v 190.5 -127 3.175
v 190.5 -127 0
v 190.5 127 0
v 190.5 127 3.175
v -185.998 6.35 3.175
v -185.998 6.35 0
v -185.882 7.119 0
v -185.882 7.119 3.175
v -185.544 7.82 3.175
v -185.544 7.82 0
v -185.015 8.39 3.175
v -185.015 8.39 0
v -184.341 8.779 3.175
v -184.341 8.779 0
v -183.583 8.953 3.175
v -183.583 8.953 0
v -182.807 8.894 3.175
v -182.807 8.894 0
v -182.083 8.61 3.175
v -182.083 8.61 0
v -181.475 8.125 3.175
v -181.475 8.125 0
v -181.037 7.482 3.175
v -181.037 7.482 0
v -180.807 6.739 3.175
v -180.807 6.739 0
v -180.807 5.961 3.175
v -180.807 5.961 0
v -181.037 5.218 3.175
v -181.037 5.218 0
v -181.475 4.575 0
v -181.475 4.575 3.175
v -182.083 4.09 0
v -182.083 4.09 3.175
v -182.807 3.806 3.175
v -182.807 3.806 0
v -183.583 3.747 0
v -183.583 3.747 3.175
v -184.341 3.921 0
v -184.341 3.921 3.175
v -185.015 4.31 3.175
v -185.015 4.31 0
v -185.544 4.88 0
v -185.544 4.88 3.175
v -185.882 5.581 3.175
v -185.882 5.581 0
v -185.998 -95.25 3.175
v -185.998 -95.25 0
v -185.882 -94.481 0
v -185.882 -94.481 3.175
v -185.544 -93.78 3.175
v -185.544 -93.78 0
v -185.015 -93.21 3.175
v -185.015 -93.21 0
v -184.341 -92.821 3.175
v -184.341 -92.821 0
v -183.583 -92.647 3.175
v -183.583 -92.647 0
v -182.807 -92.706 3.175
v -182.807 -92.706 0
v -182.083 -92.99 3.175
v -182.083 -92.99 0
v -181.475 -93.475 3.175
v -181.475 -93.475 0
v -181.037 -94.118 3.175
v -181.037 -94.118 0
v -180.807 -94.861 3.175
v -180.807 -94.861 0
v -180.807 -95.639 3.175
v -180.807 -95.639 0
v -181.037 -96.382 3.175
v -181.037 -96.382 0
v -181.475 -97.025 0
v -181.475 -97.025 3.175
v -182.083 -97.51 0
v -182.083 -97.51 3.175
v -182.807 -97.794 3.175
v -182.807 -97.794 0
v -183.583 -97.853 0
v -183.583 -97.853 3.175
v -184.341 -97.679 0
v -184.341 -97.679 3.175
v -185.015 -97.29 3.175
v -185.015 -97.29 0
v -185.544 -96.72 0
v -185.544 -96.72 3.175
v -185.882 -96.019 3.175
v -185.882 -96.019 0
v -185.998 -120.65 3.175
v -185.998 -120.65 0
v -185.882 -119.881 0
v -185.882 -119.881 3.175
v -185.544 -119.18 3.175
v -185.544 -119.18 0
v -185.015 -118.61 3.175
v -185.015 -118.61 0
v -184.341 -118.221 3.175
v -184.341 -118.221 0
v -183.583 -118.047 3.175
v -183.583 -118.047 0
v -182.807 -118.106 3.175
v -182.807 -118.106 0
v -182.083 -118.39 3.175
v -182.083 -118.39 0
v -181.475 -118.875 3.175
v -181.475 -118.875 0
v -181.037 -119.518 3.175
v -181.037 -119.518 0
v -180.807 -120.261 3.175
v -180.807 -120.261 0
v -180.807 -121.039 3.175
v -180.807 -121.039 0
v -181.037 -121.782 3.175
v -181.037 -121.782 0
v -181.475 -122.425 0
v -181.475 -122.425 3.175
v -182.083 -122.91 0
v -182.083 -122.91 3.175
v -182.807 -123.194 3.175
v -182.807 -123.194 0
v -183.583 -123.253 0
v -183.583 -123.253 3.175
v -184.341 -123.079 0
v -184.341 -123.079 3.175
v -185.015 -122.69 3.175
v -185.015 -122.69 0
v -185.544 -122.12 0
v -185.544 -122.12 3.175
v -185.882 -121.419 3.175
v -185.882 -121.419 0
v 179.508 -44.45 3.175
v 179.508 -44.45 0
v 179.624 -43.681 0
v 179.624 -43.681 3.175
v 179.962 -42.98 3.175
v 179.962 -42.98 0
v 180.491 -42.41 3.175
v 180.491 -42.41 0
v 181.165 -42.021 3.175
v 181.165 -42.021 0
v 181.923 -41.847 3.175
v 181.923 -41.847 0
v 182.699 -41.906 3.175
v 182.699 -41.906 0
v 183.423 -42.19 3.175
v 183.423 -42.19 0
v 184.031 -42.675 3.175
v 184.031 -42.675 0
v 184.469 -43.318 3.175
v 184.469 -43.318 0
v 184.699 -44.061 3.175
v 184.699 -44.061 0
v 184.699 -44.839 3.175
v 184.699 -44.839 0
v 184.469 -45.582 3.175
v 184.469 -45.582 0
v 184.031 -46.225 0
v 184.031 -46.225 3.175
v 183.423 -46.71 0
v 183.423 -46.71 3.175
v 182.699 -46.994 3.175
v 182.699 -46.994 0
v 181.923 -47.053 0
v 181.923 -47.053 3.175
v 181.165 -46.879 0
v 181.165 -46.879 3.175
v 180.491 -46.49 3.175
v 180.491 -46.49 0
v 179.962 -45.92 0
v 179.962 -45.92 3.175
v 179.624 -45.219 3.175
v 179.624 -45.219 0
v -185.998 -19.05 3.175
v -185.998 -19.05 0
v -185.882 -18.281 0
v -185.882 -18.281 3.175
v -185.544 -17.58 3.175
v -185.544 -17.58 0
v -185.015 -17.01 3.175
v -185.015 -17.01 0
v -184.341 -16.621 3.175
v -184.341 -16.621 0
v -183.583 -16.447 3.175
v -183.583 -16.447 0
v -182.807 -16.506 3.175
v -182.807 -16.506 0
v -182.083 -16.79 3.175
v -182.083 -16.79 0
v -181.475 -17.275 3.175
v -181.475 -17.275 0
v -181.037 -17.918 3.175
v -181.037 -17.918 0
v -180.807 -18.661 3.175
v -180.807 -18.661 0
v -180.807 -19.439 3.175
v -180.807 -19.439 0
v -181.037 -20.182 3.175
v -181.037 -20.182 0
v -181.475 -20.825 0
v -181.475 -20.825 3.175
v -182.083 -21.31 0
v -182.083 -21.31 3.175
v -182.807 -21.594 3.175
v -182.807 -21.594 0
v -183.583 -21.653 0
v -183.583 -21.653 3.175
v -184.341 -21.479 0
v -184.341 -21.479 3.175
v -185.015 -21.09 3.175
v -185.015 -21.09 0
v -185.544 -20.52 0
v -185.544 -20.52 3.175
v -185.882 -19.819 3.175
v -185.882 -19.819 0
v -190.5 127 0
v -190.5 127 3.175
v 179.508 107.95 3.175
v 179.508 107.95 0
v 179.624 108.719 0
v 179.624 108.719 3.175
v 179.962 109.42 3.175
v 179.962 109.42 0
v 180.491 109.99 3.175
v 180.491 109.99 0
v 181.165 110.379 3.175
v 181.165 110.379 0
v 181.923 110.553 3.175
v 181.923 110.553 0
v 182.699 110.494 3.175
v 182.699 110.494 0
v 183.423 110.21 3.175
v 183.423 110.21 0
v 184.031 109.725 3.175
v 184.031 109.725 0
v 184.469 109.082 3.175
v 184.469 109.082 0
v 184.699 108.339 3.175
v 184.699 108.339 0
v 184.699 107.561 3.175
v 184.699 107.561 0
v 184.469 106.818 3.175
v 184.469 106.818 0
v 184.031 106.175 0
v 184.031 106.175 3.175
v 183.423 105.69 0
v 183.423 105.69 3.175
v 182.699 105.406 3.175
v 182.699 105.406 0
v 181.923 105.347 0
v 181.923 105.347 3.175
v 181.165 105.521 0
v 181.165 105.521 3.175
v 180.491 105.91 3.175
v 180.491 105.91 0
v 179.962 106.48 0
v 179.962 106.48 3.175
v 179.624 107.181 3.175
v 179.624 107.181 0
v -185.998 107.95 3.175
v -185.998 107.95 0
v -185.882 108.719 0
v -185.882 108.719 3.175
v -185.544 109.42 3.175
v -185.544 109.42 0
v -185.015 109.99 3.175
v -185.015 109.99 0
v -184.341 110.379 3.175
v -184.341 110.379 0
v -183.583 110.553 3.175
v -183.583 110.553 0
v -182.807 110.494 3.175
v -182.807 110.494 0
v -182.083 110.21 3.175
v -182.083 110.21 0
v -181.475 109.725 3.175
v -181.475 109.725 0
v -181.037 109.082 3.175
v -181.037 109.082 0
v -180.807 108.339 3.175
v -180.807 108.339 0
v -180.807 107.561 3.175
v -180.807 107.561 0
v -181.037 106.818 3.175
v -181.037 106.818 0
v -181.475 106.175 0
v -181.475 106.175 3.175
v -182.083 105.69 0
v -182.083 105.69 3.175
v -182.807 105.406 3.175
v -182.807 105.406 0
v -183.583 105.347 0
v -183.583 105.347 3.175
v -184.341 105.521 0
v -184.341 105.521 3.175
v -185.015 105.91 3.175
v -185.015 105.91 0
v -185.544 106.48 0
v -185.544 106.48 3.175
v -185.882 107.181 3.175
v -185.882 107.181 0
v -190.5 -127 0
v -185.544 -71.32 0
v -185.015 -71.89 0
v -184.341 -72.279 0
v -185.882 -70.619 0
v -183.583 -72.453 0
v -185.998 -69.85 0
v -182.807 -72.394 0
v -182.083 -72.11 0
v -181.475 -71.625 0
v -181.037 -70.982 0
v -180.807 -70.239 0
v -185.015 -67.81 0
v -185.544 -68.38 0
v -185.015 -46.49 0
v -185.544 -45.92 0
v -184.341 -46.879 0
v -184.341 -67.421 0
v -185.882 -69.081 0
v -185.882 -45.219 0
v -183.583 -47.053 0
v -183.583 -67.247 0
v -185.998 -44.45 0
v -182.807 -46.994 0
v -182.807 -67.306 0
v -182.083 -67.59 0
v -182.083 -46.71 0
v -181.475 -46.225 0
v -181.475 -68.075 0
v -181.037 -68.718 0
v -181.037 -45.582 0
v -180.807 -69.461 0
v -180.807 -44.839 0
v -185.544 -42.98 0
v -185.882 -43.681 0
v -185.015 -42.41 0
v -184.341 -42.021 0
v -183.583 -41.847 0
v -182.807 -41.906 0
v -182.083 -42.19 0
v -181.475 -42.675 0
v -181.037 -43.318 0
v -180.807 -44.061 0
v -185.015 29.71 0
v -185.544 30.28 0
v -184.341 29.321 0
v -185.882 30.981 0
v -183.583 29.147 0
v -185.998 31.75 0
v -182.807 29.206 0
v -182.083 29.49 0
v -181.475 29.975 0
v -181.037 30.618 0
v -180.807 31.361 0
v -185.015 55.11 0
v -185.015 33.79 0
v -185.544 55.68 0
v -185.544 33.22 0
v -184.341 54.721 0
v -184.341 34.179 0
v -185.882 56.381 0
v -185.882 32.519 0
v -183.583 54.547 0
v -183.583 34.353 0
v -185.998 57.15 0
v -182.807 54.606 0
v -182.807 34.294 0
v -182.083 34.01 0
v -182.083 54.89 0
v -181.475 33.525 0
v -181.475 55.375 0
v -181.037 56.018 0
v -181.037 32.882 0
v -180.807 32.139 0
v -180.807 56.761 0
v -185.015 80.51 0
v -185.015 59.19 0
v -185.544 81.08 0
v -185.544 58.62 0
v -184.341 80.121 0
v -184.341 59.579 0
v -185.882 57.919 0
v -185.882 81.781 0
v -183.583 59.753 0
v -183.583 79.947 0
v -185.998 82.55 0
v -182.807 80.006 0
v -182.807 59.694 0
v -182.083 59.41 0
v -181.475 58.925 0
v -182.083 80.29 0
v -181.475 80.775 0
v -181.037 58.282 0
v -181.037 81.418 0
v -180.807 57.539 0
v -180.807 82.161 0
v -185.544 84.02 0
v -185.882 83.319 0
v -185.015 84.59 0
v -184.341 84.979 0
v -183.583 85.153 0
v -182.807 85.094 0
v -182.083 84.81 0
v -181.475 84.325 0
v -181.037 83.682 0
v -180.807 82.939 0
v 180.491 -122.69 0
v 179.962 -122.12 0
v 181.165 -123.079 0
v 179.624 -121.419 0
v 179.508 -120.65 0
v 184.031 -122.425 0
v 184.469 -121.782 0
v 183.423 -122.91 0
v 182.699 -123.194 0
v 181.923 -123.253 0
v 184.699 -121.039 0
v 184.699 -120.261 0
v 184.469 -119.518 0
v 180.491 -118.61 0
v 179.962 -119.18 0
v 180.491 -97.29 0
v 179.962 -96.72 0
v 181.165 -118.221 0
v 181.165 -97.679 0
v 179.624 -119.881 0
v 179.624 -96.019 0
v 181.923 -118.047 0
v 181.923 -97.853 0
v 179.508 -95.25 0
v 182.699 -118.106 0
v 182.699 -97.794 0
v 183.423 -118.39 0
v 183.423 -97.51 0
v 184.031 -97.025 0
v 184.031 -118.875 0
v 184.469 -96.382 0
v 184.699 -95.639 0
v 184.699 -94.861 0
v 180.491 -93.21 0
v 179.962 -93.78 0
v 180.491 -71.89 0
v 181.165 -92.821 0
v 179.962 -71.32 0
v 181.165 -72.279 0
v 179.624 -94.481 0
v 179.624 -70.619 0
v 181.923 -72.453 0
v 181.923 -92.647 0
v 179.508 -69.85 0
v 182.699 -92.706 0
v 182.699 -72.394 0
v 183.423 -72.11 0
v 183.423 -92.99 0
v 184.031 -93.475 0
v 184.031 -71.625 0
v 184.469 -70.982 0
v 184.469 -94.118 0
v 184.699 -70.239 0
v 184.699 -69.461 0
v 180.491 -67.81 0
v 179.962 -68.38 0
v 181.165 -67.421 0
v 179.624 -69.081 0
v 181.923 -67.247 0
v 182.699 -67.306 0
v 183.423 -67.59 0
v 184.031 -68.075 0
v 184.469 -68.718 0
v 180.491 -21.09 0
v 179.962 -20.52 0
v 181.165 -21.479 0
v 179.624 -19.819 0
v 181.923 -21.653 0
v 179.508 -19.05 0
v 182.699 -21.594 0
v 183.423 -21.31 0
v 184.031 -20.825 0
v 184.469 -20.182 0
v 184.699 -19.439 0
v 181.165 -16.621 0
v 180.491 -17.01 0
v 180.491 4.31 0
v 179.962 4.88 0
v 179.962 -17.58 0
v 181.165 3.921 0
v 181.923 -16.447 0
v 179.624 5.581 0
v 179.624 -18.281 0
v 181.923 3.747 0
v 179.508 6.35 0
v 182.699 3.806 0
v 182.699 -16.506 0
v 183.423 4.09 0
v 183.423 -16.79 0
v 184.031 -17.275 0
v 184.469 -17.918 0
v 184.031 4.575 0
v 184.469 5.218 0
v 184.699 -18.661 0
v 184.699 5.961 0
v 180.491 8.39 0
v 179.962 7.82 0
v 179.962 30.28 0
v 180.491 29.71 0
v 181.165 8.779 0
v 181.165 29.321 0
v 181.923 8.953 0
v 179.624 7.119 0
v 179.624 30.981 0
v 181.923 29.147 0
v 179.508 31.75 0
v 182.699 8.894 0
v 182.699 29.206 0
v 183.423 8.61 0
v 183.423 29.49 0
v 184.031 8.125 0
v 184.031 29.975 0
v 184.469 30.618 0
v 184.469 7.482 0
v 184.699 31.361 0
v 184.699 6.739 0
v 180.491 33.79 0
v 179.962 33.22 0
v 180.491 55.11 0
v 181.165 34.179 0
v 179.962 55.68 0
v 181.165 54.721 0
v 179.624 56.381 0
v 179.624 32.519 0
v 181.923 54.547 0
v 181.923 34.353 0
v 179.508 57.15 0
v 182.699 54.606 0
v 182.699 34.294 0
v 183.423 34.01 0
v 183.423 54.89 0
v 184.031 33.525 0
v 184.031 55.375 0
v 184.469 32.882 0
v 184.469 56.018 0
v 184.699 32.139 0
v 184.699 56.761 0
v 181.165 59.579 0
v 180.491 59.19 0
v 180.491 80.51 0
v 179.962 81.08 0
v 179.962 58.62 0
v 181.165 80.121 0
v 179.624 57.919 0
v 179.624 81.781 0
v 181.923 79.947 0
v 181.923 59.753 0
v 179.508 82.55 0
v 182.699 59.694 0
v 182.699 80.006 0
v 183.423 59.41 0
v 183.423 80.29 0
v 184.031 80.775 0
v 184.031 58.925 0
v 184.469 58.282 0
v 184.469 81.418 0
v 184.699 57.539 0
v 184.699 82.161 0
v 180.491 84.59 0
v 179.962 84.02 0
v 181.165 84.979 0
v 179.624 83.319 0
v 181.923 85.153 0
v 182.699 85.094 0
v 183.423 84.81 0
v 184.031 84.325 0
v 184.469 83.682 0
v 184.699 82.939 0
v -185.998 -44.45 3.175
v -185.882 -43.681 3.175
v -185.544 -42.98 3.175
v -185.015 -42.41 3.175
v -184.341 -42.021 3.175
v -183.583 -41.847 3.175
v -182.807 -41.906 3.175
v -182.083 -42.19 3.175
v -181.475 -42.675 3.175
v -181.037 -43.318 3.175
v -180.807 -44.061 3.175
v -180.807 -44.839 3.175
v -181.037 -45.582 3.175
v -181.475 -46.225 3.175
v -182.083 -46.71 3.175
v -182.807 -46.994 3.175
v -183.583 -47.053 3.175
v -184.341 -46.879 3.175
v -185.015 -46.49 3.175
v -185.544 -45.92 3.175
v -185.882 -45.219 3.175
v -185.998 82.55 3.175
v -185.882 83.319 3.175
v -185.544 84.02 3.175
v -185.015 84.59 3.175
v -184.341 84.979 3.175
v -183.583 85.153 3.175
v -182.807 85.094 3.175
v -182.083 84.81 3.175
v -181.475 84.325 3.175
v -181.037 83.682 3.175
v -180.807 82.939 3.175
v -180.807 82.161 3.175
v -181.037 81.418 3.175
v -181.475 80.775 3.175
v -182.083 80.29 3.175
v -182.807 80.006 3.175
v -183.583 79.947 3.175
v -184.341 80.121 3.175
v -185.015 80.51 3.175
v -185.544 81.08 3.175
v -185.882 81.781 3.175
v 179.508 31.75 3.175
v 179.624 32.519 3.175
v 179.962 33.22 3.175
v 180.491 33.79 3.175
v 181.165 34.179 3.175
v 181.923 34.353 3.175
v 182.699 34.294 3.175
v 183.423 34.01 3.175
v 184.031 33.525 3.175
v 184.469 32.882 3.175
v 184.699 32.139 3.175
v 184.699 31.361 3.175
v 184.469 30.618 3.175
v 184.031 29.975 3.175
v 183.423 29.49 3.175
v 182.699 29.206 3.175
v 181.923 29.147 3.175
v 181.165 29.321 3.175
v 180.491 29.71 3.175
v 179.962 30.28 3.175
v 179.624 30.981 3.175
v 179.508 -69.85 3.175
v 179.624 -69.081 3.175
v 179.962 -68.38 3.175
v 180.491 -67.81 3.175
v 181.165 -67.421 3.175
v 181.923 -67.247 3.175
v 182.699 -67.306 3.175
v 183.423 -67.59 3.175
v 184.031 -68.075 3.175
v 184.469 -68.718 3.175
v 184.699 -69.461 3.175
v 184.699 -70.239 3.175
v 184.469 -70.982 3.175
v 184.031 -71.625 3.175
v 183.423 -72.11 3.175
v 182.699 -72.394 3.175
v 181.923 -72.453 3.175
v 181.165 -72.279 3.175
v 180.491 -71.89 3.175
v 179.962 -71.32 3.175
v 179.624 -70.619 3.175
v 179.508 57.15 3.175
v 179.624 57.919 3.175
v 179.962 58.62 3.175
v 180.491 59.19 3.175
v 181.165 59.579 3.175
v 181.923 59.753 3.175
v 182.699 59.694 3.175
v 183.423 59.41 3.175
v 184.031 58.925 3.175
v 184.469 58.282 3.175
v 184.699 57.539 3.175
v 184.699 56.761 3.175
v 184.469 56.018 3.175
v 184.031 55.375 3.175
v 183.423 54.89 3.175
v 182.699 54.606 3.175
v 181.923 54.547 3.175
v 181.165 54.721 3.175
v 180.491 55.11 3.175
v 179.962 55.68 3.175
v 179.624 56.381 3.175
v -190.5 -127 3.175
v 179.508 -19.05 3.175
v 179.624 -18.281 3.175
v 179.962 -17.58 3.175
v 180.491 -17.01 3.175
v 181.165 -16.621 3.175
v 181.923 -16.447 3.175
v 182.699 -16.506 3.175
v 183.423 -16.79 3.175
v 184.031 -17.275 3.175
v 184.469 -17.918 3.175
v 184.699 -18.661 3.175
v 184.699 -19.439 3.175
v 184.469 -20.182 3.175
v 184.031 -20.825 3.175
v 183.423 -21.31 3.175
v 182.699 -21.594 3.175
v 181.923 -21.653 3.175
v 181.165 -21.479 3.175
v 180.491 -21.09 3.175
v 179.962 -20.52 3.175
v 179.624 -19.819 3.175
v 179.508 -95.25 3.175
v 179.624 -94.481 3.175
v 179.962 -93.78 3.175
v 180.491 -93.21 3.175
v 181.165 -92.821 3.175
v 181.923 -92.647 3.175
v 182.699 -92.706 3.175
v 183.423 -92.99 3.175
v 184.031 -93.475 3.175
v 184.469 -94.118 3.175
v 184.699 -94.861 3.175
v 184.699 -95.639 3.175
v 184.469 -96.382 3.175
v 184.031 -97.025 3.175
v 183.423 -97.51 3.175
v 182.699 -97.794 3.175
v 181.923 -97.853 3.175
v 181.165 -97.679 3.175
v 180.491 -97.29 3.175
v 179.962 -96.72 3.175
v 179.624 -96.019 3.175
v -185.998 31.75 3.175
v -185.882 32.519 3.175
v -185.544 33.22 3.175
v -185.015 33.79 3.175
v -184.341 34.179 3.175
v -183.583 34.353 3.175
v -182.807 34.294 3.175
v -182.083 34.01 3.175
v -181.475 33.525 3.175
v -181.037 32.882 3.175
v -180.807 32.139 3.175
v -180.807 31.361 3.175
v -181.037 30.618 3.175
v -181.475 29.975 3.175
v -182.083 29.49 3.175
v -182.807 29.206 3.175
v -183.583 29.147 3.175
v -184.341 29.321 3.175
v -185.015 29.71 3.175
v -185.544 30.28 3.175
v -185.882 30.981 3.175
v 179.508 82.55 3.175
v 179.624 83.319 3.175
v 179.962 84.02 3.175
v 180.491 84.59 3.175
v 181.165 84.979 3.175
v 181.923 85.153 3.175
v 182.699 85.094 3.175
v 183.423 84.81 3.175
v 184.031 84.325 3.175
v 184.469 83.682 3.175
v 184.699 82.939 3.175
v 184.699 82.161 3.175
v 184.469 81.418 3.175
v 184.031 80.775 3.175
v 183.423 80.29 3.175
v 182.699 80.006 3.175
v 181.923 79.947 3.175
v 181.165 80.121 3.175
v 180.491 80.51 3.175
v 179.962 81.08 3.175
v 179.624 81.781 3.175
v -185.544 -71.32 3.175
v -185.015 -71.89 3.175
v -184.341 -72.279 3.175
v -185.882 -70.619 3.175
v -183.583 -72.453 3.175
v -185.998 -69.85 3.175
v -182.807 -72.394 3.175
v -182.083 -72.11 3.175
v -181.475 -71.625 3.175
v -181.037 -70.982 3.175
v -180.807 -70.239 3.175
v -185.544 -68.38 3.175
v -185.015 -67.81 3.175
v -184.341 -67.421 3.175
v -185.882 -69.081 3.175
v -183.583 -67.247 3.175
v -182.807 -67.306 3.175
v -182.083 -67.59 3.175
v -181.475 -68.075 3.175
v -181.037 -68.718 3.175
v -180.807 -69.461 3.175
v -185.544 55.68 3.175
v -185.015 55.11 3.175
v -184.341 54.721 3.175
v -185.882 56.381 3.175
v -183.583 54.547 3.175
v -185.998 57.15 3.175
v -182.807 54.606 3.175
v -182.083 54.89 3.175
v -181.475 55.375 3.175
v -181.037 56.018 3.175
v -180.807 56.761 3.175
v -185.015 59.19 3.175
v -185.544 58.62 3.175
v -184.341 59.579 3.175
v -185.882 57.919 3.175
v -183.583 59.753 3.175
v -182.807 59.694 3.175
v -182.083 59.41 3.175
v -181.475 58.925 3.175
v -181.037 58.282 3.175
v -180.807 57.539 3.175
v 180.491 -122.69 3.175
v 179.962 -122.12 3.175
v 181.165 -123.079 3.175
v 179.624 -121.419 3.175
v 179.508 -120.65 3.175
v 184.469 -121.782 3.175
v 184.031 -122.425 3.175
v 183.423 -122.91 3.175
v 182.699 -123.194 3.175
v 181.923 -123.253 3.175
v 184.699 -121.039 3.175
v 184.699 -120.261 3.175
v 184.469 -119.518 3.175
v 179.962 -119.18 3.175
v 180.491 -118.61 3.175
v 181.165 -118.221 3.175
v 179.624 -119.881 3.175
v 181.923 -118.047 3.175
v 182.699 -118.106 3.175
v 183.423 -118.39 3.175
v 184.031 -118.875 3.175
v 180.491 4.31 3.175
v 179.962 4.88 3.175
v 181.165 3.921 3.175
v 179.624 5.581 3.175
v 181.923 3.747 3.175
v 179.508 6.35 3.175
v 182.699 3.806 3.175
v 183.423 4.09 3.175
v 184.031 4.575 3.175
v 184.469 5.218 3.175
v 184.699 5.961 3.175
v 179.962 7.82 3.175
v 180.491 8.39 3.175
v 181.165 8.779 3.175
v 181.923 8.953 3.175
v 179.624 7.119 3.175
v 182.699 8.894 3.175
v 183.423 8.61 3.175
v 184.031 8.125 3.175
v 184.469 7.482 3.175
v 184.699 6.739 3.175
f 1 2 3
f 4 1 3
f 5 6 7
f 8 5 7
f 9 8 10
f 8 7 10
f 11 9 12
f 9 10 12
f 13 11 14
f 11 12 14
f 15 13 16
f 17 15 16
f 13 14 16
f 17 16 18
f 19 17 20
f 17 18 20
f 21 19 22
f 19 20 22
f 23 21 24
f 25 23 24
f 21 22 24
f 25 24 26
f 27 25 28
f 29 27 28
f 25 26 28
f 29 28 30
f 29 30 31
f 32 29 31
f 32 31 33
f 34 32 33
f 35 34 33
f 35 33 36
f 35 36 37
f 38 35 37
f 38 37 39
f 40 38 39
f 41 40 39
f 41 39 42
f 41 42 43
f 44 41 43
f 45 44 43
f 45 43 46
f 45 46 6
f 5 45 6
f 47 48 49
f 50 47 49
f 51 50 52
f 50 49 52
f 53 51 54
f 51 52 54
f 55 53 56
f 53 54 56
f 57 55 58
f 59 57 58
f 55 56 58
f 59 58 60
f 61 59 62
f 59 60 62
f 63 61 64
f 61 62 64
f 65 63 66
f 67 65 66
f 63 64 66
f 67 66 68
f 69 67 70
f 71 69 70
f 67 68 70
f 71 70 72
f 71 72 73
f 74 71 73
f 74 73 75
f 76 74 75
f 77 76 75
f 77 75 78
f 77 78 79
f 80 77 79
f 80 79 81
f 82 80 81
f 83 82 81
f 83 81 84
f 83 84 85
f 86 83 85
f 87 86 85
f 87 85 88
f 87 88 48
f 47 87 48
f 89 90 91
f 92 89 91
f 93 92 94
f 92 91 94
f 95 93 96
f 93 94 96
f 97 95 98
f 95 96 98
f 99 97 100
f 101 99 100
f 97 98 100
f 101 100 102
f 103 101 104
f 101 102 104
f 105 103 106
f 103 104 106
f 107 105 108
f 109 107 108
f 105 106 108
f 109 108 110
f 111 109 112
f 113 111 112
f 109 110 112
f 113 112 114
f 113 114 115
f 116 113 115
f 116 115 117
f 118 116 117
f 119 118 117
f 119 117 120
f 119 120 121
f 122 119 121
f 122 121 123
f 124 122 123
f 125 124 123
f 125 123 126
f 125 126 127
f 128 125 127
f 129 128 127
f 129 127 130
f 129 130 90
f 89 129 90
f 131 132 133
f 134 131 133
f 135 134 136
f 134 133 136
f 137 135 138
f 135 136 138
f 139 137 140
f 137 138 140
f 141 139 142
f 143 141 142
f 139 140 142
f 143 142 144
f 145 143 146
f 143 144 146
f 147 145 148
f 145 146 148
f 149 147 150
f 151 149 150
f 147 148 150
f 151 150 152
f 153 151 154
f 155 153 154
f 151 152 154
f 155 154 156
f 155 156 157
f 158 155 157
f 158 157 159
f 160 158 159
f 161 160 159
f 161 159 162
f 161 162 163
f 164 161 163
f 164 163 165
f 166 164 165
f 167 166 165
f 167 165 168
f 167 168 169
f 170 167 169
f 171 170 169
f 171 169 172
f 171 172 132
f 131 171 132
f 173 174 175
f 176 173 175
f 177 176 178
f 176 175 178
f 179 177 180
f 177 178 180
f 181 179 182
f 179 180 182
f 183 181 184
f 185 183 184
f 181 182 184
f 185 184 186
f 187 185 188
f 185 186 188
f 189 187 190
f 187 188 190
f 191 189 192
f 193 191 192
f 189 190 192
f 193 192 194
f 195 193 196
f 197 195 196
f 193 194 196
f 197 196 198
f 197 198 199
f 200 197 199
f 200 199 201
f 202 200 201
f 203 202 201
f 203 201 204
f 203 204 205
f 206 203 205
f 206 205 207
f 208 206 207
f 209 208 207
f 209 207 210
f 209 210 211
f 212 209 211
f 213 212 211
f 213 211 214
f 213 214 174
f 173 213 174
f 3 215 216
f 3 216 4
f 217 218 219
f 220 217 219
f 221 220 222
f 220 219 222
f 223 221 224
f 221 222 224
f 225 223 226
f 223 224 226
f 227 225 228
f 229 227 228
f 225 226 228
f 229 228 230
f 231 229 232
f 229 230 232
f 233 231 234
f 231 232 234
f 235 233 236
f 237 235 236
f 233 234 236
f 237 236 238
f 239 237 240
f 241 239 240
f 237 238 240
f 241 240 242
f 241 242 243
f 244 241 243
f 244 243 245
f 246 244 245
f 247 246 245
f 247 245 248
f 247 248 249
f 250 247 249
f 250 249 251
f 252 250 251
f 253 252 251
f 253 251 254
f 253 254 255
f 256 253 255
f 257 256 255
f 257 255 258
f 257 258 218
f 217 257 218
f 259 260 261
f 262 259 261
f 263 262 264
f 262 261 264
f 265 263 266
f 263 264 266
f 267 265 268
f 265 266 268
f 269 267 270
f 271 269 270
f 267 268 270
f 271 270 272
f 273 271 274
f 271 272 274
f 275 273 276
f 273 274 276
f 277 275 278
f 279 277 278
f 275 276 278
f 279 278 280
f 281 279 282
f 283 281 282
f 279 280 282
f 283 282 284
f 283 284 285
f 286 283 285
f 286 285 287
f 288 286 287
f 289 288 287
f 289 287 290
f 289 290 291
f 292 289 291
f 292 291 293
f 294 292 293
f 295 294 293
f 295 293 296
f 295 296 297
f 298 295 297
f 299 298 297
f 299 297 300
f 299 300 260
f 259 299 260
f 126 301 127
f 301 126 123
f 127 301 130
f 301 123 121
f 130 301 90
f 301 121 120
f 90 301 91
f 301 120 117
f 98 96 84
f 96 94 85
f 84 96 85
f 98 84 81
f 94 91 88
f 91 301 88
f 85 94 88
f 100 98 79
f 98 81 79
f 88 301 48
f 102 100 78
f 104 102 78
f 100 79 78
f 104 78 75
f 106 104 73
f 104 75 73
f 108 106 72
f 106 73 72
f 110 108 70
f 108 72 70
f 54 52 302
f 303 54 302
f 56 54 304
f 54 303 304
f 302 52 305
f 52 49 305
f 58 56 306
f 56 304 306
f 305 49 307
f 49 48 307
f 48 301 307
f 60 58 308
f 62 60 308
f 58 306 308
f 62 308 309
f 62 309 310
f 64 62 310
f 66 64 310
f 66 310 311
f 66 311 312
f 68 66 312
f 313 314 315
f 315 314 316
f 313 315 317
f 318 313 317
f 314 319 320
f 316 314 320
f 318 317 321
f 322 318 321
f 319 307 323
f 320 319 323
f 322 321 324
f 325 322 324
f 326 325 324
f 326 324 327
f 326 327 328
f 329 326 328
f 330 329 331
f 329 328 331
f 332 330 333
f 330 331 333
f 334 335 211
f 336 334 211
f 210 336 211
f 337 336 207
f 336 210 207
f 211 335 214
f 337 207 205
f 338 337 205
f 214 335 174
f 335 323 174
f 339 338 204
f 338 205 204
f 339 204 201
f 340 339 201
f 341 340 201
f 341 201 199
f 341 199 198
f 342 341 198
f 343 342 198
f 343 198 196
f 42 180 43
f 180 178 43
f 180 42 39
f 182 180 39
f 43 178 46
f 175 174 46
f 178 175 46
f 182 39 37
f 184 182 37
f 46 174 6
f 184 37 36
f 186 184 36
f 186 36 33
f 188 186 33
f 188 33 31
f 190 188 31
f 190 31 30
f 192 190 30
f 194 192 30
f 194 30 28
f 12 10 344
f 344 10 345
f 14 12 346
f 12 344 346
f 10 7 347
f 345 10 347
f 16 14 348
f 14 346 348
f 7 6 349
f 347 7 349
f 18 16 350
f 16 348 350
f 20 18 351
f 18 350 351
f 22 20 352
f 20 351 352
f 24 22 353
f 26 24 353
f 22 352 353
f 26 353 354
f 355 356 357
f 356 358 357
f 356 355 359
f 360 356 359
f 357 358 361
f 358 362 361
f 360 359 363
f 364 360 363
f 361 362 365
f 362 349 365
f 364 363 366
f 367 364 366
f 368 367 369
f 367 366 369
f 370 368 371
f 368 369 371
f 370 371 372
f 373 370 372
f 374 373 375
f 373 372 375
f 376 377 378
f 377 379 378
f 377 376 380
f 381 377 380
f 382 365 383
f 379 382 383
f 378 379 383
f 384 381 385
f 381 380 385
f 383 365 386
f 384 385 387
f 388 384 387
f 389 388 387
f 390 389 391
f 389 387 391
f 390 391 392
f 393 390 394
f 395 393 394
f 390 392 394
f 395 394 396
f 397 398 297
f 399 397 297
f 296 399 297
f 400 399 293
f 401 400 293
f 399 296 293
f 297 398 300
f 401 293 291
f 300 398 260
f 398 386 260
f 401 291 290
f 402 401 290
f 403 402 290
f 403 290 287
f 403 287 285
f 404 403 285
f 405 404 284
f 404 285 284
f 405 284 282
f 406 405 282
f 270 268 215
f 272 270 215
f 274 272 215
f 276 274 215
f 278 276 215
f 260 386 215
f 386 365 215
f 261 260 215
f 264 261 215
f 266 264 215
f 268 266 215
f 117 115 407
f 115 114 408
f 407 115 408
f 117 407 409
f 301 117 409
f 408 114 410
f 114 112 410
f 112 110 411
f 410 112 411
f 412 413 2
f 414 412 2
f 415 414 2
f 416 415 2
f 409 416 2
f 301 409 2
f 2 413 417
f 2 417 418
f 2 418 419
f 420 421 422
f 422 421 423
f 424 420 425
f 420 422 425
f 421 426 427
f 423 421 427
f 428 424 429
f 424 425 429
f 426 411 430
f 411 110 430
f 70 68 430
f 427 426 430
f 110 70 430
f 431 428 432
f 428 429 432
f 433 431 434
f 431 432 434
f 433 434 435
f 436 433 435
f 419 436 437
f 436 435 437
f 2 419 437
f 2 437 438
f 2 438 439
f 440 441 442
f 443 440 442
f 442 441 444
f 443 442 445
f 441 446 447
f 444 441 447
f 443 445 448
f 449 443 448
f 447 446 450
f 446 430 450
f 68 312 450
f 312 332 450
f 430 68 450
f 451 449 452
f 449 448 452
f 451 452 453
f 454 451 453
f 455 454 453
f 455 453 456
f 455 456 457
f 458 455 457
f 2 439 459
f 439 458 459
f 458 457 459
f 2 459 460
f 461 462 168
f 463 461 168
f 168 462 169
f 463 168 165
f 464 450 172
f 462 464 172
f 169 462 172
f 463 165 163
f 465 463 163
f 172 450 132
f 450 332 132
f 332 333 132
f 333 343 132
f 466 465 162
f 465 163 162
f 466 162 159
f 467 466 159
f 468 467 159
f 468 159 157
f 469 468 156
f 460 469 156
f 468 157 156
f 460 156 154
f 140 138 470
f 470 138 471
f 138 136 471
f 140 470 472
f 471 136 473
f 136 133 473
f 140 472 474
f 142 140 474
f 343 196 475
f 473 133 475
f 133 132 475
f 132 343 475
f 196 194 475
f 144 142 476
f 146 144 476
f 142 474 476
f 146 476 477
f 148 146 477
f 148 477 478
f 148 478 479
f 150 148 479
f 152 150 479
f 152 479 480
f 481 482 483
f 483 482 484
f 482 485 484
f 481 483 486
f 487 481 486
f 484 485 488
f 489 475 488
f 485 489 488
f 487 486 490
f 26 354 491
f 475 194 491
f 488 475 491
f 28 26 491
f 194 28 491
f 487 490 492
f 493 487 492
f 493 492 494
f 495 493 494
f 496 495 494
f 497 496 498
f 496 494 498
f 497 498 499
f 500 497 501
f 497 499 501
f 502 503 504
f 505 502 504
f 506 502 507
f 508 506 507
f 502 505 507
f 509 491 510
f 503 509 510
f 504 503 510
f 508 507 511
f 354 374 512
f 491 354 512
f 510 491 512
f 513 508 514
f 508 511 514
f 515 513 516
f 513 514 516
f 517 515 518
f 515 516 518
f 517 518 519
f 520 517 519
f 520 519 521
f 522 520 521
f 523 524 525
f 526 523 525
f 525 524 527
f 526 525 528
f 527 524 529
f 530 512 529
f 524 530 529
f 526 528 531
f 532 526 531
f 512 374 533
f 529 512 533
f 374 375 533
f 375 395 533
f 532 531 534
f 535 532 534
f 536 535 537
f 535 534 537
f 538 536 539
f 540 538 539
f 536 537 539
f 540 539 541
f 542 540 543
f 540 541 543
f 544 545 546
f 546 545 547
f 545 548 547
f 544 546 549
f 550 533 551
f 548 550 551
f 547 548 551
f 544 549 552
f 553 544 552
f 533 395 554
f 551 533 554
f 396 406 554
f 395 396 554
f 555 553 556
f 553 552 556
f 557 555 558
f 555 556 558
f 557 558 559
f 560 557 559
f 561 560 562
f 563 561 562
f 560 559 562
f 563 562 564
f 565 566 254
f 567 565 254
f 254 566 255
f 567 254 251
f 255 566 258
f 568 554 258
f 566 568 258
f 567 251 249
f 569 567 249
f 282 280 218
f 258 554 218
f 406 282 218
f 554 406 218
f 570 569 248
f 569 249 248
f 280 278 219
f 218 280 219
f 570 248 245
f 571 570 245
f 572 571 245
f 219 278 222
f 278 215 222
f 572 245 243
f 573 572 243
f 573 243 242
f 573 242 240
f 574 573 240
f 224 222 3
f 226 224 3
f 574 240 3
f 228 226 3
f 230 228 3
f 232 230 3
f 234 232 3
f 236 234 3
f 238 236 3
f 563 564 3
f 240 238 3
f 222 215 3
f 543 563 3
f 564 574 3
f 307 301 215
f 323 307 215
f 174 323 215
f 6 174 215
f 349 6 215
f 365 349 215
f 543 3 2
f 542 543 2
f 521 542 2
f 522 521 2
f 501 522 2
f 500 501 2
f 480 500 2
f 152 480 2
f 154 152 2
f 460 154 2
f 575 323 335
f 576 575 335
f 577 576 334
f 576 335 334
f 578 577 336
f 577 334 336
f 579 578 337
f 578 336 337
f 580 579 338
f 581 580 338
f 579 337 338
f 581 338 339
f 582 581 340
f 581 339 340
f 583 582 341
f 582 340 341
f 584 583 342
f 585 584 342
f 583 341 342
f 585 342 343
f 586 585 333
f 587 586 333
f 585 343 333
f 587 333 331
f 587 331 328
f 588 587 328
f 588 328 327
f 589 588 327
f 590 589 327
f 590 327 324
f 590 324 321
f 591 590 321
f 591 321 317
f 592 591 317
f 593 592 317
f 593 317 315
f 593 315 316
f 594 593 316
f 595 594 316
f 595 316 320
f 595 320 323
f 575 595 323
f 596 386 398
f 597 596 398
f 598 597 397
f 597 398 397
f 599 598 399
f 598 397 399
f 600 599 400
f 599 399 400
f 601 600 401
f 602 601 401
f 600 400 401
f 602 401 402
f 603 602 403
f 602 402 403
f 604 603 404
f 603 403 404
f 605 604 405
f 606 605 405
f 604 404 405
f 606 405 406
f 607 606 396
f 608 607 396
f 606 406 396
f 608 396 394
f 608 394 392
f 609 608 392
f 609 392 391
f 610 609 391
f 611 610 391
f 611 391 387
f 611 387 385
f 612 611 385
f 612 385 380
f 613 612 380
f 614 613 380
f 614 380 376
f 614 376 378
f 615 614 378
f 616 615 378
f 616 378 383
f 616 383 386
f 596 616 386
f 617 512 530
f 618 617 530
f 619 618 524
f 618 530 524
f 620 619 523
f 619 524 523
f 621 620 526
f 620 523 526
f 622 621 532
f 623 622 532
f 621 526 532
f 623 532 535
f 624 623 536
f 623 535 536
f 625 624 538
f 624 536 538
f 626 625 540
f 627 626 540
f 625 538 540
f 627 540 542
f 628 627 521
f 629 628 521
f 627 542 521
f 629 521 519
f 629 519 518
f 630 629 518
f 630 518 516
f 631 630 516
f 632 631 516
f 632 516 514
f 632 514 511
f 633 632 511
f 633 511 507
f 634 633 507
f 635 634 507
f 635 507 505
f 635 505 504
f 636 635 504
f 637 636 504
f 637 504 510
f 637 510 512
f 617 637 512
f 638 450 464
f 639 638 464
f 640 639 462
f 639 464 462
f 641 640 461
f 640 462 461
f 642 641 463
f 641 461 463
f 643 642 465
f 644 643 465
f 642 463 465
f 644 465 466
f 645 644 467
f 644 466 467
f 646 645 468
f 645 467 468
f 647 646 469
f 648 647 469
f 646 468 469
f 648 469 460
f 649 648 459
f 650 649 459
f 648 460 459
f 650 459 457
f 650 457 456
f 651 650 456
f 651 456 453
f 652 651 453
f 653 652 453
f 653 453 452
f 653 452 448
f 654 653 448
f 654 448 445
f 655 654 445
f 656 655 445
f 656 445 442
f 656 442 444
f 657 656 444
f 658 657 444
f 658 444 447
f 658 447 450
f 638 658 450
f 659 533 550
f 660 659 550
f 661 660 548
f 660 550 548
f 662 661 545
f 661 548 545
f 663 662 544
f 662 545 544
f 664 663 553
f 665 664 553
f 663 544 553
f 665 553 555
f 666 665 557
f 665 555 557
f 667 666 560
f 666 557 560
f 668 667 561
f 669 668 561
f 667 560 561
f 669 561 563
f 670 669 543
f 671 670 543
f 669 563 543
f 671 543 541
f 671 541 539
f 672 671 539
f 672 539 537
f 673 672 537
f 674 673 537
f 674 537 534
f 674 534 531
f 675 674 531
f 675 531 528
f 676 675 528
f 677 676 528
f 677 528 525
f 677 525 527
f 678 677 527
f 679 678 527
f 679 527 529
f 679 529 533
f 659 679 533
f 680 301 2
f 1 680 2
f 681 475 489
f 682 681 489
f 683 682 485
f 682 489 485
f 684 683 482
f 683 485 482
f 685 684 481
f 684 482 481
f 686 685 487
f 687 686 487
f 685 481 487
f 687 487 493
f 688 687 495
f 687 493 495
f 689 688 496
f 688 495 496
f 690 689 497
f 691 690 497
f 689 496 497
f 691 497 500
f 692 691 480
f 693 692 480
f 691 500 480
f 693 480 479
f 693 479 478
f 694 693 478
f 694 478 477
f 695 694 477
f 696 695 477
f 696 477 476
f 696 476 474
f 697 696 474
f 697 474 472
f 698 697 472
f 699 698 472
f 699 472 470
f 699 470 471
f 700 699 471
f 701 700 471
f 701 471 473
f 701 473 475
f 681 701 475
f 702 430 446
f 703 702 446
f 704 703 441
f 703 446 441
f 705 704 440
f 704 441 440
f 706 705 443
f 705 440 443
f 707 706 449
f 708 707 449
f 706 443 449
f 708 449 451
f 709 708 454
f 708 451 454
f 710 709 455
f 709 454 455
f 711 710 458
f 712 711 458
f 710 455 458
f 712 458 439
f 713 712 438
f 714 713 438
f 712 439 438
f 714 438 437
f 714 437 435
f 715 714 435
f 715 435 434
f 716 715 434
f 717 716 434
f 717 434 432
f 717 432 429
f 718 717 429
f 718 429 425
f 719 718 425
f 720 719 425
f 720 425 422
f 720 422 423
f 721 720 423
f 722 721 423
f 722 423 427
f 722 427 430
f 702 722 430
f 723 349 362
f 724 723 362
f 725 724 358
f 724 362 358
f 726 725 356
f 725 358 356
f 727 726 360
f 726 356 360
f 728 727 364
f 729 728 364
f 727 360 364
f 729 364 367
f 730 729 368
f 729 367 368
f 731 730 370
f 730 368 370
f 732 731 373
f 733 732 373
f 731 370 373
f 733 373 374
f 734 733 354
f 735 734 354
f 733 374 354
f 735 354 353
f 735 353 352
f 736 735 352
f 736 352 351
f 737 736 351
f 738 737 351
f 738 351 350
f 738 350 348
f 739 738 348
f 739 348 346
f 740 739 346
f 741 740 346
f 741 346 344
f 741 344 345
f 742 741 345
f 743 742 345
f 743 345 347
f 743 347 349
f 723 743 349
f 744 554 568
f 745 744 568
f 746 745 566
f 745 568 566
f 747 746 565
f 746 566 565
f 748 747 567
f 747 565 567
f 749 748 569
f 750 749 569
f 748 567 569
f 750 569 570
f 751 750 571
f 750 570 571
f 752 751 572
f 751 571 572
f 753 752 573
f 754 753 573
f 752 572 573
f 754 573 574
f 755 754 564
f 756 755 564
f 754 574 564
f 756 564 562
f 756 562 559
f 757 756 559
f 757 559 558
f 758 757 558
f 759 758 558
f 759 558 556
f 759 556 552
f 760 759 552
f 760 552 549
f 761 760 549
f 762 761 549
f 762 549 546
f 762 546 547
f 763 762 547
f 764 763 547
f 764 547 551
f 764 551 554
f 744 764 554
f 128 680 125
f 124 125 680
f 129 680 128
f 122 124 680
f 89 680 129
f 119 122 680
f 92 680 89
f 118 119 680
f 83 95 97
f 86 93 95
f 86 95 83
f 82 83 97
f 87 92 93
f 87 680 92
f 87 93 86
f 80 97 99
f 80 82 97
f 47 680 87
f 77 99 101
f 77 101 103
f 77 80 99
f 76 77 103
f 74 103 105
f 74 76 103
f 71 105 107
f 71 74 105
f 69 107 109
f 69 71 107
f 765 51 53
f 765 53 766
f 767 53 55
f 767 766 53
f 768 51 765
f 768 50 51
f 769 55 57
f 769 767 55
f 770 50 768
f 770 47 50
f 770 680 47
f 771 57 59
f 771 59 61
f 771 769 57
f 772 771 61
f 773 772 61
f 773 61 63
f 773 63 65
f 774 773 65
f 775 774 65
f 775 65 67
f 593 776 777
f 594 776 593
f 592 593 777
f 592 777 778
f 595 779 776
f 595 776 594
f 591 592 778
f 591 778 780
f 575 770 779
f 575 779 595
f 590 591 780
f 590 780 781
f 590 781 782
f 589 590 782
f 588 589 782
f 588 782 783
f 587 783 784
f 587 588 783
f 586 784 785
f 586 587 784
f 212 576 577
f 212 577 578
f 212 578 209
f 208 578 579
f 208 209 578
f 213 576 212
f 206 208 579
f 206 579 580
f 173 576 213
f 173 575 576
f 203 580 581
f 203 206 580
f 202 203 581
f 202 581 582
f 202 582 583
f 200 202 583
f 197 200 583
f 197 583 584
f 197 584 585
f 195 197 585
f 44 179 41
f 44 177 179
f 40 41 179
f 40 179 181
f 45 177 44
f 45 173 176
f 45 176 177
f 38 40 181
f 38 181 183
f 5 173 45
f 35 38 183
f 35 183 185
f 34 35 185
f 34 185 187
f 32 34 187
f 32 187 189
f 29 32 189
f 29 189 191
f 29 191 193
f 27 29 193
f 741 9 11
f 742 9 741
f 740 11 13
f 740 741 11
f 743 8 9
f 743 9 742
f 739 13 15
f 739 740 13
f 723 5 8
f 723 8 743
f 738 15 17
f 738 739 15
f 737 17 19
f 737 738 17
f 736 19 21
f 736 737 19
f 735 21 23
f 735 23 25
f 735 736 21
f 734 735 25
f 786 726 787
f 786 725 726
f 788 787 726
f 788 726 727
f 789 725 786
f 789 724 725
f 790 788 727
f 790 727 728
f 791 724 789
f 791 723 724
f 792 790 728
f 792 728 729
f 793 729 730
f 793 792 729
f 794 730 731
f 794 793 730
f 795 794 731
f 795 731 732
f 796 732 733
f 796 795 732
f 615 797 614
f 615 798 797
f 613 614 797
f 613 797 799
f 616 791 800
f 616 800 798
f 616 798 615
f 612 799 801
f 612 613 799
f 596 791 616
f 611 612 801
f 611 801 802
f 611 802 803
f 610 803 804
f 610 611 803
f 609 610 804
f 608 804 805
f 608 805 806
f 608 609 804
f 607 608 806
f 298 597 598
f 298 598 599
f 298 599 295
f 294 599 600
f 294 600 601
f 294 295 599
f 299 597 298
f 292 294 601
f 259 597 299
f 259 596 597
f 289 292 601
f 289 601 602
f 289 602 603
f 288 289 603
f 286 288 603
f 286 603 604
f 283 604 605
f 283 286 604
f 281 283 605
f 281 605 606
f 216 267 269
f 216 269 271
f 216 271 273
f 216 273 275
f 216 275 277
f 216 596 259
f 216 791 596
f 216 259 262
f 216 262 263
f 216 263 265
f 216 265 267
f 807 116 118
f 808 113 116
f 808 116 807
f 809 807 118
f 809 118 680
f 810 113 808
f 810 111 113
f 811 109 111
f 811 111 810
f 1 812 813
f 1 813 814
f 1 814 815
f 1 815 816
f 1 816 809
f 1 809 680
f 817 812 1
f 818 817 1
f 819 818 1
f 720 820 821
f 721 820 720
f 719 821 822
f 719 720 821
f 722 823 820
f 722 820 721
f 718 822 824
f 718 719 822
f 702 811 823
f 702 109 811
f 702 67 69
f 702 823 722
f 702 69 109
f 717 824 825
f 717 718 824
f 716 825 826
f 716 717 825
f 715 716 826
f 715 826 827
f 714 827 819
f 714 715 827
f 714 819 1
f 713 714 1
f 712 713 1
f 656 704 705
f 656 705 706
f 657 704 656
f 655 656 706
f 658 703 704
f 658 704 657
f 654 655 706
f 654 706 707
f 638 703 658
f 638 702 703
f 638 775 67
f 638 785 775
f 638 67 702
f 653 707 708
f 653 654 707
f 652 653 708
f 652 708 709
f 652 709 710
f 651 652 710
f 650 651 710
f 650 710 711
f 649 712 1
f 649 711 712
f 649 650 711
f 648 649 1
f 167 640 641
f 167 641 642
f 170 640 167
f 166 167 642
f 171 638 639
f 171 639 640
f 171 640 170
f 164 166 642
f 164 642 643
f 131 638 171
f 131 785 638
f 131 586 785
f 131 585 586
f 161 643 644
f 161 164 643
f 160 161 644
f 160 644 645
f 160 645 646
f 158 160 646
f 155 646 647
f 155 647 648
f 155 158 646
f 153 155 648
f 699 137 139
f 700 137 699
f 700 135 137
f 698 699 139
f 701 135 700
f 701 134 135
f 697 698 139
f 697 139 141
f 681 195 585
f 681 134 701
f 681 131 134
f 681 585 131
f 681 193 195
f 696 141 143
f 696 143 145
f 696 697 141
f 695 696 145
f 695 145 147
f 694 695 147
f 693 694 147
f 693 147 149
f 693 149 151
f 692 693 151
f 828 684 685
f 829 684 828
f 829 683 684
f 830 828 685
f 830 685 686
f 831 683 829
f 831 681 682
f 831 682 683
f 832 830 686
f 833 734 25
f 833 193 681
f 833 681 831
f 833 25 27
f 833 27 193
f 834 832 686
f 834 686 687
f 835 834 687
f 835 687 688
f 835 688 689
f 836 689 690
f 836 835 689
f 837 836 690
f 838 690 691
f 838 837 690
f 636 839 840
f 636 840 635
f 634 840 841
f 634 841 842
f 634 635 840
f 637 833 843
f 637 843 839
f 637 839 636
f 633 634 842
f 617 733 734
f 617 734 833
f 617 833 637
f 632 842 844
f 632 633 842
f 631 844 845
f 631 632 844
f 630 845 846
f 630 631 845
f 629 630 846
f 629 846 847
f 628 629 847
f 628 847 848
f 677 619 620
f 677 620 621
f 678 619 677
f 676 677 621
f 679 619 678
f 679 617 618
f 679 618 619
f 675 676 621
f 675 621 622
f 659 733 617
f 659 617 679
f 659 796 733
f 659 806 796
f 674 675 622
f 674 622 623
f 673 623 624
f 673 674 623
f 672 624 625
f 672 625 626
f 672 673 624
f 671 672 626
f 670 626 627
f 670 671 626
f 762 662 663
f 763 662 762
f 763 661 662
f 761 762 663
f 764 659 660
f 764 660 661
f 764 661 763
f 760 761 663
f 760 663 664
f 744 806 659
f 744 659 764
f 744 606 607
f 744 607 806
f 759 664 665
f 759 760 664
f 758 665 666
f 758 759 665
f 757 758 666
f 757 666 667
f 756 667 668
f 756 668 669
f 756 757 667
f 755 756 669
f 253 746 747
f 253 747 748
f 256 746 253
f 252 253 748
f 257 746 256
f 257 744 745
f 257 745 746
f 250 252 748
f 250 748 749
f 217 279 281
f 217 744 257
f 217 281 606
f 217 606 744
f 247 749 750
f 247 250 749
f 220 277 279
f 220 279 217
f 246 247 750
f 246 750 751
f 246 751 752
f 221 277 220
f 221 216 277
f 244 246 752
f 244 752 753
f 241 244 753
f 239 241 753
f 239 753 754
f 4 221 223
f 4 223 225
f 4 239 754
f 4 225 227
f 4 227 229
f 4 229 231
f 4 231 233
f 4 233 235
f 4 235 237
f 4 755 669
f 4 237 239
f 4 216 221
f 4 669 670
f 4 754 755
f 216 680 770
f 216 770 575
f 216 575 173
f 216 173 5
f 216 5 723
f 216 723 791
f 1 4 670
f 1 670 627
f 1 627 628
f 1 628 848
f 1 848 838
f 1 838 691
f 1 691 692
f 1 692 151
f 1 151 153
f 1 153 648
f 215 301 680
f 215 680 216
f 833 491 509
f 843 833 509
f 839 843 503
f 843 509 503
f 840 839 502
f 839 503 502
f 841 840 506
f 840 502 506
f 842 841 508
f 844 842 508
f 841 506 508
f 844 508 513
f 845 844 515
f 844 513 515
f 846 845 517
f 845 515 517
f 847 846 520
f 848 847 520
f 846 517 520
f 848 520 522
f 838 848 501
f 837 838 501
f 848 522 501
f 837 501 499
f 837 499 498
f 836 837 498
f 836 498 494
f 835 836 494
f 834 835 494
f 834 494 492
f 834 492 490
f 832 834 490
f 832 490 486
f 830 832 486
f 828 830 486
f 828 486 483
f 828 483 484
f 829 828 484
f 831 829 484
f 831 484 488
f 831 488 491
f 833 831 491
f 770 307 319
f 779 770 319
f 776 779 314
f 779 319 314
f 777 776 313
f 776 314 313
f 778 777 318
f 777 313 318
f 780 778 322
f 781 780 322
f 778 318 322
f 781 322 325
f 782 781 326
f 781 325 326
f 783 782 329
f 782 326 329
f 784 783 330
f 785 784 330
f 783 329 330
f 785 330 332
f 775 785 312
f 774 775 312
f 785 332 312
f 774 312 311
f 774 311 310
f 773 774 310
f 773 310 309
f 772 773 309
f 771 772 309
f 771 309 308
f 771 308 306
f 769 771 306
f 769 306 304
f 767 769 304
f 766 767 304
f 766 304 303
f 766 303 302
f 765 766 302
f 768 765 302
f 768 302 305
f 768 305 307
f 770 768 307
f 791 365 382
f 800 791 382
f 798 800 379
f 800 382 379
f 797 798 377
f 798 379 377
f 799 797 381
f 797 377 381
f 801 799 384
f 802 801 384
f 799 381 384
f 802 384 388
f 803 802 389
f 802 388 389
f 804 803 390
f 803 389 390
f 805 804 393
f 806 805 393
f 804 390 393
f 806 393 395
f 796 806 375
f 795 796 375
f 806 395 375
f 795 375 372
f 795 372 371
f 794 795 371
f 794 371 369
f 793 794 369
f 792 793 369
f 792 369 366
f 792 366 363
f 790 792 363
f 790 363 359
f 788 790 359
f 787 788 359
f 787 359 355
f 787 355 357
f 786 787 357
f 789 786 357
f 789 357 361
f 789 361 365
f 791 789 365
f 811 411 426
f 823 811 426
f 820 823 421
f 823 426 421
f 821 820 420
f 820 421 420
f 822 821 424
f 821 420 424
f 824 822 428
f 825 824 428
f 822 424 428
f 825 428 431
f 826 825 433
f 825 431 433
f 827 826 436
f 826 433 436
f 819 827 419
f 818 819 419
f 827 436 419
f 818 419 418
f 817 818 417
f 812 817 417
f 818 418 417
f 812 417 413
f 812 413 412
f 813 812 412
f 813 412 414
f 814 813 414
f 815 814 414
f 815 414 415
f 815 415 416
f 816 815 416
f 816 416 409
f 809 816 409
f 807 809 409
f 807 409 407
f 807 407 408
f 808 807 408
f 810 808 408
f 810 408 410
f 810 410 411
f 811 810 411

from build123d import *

# Parameters (mm, degrees)
SKETCH1_W                   = 381
SKETCH1_H                   = 254
BOSS_EXTRUDE1_DEPTH         = 3.175
F_5_0_2055_DIAMETER_HOLE1_D = 5.2197


with BuildPart() as part:
    # Sketch1 → Boss-Extrude1 (new body)
    with BuildSketch(Plane.XY):
        Rectangle(SKETCH1_W, SKETCH1_H)
    extrude(amount=BOSS_EXTRUDE1_DEPTH)

    # #5 (0.2055) Diameter Hole1 (through all)
    with Locations(Plane.XY.offset(3.175)):
        with Locations((-183.388, 107.95), (-183.388, 82.55), (-183.388, 57.15), (-183.388, 31.75), (-183.388, 6.35), (-183.388, -19.05), (-183.388, -44.45), (-183.388, -69.85), (-183.388, -120.65), (-183.388, -95.25), (182.118, -120.65), (182.118, -95.25), (182.118, -69.85), (182.118, -44.45), (182.118, -19.05), (182.118, 6.35), (182.118, 31.75), (182.118, 57.15), (182.118, 82.55), (182.118, 107.95)):
            Hole(F_5_0_2055_DIAMETER_HOLE1_D / 2)


solid = part.part
